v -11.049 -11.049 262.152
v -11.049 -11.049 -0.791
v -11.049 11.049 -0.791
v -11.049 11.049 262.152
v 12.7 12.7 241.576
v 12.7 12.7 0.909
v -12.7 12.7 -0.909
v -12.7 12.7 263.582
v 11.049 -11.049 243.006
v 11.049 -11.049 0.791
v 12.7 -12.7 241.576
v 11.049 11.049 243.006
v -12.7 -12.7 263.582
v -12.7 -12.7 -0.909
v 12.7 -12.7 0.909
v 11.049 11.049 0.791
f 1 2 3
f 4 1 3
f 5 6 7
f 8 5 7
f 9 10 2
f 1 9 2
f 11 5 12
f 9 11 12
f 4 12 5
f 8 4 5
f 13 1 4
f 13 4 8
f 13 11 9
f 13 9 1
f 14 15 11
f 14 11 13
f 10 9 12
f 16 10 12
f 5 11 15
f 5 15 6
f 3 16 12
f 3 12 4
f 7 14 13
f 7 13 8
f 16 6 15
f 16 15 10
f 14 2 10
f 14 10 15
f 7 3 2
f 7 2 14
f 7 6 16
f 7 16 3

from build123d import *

# Parameters (mm, degrees)
SKETCH1_W           = 25.4
SKETCH1_H           = 25.4
SKETCH1_W_2         = 22.098
SKETCH1_H_2         = 22.098
BOSS_EXTRUDE1_DEPTH = 252.579
SKETCH5_W           = 25.4
SKETCH5_H           = 25.4
SKETCH5_W_2         = 22.098
SKETCH5_H_2         = 22.098
BOSS_EXTRUDE2_DEPTH = 12.7
CUT_EXTRUDE1_DEPTH  = 36.4
SKETCH7_W           = 25.4
SKETCH7_H           = 25.4
SKETCH7_W_2         = 22.098
SKETCH7_H_2         = 22.098
BOSS_EXTRUDE3_DEPTH = 25.4
CUT_EXTRUDE2_DEPTH  = 165.021579309


with BuildPart() as part:
    # Sketch1 → Boss-Extrude1 (new body)
    with BuildSketch(Plane.XY):
        Rectangle(SKETCH1_W, SKETCH1_H)
        Rectangle(SKETCH1_W_2, SKETCH1_H_2, mode=Mode.SUBTRACT)
    extrude(amount=BOSS_EXTRUDE1_DEPTH)

    # Sketch5 → Boss-Extrude2 (add)
    with BuildSketch(Plane.XY.offset(252.579)):
        Rectangle(SKETCH5_W, SKETCH5_H)
        Rectangle(SKETCH5_W_2, SKETCH5_H_2, mode=Mode.SUBTRACT)
    extrude(amount=BOSS_EXTRUDE2_DEPTH)

    # Sketch6 → Cut-Extrude1 (cut, through all)
    with BuildSketch(Plane(origin=(0, -22.7, 252.579), x_dir=(-0.142456183, 0, 0.989801109), z_dir=(0, -1, 0))):
        Polygon((-25.049344305, -21.702249197), (26.869925532, 23.279564235), (45.864950848, -41.551460554), align=None)
    extrude(amount=-CUT_EXTRUDE1_DEPTH, mode=Mode.SUBTRACT)

    # Sketch7 → Boss-Extrude3 (add)
    with BuildSketch(Plane(origin=(0, 0, 0), x_dir=(-1, 0, 0), z_dir=(0, 0, -1))):
        Rectangle(SKETCH7_W, SKETCH7_H)
        Rectangle(SKETCH7_W_2, SKETCH7_H_2, mode=Mode.SUBTRACT)
    extrude(amount=BOSS_EXTRUDE3_DEPTH)

    # Sketch8 → Cut-Extrude2 (cut, through all)
    with BuildSketch(Plane(origin=(602.971957407, 151.321579309, -52.668394102), x_dir=(0.142456183, 0, -0.989801109), z_dir=(0, -1, 0))):
        Polygon((-136.208901871, -563.906106683), (-139.847734949, -614.732641149), (-41.725602435, -599.280432209), align=None)
    extrude(amount=CUT_EXTRUDE2_DEPTH, mode=Mode.SUBTRACT)


solid = part.part
